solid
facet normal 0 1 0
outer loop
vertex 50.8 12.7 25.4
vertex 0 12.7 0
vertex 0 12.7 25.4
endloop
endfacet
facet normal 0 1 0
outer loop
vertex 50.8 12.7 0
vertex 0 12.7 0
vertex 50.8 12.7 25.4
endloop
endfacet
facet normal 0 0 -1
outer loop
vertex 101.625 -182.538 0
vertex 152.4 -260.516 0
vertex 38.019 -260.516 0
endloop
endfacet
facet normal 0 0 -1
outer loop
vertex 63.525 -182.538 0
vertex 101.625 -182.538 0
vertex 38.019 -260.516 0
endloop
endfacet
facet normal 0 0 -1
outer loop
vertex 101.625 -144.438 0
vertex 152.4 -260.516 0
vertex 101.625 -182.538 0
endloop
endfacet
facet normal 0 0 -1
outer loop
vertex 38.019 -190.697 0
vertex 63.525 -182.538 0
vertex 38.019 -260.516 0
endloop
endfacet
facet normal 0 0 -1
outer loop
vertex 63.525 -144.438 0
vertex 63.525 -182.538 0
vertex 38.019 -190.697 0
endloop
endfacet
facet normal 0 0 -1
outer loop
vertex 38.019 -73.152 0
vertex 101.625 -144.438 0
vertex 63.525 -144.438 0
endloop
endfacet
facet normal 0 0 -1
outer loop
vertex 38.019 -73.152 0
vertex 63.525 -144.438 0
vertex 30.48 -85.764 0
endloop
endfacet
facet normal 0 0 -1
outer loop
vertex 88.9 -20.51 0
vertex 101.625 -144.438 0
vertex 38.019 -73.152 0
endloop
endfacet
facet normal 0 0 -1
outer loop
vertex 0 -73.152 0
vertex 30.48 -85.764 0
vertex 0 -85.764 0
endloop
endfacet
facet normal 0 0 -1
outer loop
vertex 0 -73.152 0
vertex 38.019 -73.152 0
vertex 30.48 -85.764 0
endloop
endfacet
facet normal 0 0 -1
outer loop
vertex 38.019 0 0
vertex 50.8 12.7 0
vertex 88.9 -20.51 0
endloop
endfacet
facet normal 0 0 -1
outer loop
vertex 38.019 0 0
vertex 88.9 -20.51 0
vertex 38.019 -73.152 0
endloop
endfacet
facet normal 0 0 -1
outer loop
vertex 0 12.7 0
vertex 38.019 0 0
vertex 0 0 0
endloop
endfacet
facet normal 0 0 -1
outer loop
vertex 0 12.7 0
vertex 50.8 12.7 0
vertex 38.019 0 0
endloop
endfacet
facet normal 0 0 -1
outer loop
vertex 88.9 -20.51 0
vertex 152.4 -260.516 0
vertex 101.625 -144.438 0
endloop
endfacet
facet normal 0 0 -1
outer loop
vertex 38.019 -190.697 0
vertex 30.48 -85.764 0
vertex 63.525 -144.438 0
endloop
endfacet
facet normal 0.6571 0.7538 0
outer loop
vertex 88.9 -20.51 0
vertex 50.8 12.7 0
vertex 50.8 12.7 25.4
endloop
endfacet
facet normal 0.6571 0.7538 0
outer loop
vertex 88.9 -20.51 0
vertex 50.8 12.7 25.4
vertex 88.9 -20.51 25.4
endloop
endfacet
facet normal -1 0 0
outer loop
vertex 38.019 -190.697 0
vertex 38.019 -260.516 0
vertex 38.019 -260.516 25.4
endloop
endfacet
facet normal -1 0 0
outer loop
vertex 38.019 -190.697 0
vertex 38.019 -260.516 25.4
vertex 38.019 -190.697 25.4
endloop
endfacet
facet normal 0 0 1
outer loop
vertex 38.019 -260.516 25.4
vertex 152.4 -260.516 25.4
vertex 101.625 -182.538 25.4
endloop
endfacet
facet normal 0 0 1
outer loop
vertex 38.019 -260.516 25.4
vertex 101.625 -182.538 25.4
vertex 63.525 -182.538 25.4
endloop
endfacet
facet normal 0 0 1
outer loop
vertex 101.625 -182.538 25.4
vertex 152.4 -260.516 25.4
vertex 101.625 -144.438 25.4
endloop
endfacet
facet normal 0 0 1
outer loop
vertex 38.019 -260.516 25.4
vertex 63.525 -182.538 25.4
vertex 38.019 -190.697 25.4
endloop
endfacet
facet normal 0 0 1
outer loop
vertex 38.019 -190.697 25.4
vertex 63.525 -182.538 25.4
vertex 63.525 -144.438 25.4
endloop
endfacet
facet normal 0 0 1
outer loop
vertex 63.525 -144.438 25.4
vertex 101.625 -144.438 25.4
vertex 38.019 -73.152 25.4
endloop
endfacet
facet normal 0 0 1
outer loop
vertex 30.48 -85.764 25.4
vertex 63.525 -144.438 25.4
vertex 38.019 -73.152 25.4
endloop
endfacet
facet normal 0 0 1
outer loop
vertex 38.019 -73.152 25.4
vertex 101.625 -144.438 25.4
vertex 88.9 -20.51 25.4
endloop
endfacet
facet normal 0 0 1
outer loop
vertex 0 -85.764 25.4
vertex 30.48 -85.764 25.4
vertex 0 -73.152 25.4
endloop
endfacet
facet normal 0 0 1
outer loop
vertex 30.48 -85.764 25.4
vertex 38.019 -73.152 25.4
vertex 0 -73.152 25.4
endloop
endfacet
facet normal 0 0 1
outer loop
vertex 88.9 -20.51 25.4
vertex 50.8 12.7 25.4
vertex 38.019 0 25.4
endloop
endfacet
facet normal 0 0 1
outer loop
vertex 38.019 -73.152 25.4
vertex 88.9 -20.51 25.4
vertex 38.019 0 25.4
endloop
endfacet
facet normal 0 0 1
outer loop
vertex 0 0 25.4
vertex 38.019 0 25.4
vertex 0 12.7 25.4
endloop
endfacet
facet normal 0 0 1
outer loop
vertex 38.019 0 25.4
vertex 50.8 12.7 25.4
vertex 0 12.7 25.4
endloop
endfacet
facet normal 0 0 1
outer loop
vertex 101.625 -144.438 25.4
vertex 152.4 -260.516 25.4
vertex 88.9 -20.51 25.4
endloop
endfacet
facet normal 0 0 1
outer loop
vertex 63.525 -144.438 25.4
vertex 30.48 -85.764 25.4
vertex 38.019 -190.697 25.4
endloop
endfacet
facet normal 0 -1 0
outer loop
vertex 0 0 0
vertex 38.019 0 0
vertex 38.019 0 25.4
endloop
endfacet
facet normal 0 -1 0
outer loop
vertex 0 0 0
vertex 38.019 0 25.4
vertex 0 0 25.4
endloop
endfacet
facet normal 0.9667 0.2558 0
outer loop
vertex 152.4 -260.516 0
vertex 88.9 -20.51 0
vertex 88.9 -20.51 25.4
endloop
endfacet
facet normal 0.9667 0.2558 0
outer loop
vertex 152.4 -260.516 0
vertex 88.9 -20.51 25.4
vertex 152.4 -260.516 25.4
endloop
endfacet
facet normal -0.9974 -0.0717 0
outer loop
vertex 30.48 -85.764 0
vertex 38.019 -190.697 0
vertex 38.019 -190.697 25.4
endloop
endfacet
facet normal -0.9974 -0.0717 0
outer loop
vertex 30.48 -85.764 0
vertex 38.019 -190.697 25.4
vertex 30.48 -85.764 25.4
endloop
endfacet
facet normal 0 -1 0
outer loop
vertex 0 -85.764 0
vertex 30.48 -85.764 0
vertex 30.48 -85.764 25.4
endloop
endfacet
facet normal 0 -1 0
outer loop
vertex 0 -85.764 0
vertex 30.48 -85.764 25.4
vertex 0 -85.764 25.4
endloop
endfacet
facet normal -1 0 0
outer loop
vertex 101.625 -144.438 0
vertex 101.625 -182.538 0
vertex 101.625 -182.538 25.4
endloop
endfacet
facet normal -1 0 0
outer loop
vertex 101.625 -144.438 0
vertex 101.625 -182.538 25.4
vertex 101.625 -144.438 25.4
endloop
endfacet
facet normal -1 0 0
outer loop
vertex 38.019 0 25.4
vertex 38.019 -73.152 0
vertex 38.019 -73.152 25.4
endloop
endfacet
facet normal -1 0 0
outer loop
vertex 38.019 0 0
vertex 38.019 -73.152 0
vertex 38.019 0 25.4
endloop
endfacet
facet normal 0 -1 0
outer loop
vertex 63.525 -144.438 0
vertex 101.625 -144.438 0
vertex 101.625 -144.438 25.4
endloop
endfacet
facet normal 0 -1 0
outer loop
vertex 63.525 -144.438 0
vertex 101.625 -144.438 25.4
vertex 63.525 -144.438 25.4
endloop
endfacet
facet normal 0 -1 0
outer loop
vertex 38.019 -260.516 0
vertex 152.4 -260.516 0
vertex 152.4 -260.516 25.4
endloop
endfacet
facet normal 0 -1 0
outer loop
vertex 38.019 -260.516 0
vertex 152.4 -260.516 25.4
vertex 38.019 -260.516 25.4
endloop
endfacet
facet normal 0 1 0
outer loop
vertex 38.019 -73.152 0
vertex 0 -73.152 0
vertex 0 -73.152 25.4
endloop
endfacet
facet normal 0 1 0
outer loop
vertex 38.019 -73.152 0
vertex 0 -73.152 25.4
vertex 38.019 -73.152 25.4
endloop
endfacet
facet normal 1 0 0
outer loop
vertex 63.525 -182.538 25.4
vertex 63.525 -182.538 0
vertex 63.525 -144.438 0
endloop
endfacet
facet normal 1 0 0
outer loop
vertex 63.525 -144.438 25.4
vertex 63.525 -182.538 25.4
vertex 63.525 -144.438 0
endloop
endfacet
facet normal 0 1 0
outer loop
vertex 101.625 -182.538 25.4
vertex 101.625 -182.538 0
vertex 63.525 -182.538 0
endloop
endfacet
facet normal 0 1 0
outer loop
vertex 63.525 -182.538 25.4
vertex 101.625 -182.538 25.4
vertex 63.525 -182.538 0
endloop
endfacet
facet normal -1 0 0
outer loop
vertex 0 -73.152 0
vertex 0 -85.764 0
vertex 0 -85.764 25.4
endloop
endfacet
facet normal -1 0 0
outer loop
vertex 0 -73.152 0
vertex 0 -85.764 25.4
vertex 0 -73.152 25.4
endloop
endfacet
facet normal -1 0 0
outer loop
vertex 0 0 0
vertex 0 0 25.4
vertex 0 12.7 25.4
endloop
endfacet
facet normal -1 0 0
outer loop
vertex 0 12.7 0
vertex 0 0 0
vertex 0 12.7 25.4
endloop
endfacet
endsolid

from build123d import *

# Parameters (mm, degrees)
BOSS_EXTRUDE1_DEPTH = 25.4
SKETCH2_W           = 38.1
SKETCH2_H           = 38.1
CUT_EXTRUDE1_DEPTH  = 303.885239179


with BuildPart() as part:
    # Sketch1 → Boss-Extrude1 (new body)
    with BuildSketch(Plane.XY):
        Polygon((0, 0), (0, 12.7), (50.8, 12.7), (88.9, -20.510228633), (152.4, -260.515926793), (38.018659419, -260.515926793), (38.018659419, -190.696503564), (30.48, -85.763926793), (0, -85.763926793), (0, -73.152260366), (38.018659419, -73.152260366), (38.018659419, 0), align=None)
    extrude(amount=BOSS_EXTRUDE1_DEPTH)

    # Sketch2 → Cut-Extrude1 (cut, through all)
    with BuildSketch(Plane(origin=(0, 0, 0), x_dir=(-1, 0, 0), z_dir=(0, 0, -1))):
        with Locations((-82.574564704, -163.487926793)):
            Rectangle(SKETCH2_W, SKETCH2_H)
    extrude(amount=-CUT_EXTRUDE1_DEPTH, mode=Mode.SUBTRACT)


solid = part.part
